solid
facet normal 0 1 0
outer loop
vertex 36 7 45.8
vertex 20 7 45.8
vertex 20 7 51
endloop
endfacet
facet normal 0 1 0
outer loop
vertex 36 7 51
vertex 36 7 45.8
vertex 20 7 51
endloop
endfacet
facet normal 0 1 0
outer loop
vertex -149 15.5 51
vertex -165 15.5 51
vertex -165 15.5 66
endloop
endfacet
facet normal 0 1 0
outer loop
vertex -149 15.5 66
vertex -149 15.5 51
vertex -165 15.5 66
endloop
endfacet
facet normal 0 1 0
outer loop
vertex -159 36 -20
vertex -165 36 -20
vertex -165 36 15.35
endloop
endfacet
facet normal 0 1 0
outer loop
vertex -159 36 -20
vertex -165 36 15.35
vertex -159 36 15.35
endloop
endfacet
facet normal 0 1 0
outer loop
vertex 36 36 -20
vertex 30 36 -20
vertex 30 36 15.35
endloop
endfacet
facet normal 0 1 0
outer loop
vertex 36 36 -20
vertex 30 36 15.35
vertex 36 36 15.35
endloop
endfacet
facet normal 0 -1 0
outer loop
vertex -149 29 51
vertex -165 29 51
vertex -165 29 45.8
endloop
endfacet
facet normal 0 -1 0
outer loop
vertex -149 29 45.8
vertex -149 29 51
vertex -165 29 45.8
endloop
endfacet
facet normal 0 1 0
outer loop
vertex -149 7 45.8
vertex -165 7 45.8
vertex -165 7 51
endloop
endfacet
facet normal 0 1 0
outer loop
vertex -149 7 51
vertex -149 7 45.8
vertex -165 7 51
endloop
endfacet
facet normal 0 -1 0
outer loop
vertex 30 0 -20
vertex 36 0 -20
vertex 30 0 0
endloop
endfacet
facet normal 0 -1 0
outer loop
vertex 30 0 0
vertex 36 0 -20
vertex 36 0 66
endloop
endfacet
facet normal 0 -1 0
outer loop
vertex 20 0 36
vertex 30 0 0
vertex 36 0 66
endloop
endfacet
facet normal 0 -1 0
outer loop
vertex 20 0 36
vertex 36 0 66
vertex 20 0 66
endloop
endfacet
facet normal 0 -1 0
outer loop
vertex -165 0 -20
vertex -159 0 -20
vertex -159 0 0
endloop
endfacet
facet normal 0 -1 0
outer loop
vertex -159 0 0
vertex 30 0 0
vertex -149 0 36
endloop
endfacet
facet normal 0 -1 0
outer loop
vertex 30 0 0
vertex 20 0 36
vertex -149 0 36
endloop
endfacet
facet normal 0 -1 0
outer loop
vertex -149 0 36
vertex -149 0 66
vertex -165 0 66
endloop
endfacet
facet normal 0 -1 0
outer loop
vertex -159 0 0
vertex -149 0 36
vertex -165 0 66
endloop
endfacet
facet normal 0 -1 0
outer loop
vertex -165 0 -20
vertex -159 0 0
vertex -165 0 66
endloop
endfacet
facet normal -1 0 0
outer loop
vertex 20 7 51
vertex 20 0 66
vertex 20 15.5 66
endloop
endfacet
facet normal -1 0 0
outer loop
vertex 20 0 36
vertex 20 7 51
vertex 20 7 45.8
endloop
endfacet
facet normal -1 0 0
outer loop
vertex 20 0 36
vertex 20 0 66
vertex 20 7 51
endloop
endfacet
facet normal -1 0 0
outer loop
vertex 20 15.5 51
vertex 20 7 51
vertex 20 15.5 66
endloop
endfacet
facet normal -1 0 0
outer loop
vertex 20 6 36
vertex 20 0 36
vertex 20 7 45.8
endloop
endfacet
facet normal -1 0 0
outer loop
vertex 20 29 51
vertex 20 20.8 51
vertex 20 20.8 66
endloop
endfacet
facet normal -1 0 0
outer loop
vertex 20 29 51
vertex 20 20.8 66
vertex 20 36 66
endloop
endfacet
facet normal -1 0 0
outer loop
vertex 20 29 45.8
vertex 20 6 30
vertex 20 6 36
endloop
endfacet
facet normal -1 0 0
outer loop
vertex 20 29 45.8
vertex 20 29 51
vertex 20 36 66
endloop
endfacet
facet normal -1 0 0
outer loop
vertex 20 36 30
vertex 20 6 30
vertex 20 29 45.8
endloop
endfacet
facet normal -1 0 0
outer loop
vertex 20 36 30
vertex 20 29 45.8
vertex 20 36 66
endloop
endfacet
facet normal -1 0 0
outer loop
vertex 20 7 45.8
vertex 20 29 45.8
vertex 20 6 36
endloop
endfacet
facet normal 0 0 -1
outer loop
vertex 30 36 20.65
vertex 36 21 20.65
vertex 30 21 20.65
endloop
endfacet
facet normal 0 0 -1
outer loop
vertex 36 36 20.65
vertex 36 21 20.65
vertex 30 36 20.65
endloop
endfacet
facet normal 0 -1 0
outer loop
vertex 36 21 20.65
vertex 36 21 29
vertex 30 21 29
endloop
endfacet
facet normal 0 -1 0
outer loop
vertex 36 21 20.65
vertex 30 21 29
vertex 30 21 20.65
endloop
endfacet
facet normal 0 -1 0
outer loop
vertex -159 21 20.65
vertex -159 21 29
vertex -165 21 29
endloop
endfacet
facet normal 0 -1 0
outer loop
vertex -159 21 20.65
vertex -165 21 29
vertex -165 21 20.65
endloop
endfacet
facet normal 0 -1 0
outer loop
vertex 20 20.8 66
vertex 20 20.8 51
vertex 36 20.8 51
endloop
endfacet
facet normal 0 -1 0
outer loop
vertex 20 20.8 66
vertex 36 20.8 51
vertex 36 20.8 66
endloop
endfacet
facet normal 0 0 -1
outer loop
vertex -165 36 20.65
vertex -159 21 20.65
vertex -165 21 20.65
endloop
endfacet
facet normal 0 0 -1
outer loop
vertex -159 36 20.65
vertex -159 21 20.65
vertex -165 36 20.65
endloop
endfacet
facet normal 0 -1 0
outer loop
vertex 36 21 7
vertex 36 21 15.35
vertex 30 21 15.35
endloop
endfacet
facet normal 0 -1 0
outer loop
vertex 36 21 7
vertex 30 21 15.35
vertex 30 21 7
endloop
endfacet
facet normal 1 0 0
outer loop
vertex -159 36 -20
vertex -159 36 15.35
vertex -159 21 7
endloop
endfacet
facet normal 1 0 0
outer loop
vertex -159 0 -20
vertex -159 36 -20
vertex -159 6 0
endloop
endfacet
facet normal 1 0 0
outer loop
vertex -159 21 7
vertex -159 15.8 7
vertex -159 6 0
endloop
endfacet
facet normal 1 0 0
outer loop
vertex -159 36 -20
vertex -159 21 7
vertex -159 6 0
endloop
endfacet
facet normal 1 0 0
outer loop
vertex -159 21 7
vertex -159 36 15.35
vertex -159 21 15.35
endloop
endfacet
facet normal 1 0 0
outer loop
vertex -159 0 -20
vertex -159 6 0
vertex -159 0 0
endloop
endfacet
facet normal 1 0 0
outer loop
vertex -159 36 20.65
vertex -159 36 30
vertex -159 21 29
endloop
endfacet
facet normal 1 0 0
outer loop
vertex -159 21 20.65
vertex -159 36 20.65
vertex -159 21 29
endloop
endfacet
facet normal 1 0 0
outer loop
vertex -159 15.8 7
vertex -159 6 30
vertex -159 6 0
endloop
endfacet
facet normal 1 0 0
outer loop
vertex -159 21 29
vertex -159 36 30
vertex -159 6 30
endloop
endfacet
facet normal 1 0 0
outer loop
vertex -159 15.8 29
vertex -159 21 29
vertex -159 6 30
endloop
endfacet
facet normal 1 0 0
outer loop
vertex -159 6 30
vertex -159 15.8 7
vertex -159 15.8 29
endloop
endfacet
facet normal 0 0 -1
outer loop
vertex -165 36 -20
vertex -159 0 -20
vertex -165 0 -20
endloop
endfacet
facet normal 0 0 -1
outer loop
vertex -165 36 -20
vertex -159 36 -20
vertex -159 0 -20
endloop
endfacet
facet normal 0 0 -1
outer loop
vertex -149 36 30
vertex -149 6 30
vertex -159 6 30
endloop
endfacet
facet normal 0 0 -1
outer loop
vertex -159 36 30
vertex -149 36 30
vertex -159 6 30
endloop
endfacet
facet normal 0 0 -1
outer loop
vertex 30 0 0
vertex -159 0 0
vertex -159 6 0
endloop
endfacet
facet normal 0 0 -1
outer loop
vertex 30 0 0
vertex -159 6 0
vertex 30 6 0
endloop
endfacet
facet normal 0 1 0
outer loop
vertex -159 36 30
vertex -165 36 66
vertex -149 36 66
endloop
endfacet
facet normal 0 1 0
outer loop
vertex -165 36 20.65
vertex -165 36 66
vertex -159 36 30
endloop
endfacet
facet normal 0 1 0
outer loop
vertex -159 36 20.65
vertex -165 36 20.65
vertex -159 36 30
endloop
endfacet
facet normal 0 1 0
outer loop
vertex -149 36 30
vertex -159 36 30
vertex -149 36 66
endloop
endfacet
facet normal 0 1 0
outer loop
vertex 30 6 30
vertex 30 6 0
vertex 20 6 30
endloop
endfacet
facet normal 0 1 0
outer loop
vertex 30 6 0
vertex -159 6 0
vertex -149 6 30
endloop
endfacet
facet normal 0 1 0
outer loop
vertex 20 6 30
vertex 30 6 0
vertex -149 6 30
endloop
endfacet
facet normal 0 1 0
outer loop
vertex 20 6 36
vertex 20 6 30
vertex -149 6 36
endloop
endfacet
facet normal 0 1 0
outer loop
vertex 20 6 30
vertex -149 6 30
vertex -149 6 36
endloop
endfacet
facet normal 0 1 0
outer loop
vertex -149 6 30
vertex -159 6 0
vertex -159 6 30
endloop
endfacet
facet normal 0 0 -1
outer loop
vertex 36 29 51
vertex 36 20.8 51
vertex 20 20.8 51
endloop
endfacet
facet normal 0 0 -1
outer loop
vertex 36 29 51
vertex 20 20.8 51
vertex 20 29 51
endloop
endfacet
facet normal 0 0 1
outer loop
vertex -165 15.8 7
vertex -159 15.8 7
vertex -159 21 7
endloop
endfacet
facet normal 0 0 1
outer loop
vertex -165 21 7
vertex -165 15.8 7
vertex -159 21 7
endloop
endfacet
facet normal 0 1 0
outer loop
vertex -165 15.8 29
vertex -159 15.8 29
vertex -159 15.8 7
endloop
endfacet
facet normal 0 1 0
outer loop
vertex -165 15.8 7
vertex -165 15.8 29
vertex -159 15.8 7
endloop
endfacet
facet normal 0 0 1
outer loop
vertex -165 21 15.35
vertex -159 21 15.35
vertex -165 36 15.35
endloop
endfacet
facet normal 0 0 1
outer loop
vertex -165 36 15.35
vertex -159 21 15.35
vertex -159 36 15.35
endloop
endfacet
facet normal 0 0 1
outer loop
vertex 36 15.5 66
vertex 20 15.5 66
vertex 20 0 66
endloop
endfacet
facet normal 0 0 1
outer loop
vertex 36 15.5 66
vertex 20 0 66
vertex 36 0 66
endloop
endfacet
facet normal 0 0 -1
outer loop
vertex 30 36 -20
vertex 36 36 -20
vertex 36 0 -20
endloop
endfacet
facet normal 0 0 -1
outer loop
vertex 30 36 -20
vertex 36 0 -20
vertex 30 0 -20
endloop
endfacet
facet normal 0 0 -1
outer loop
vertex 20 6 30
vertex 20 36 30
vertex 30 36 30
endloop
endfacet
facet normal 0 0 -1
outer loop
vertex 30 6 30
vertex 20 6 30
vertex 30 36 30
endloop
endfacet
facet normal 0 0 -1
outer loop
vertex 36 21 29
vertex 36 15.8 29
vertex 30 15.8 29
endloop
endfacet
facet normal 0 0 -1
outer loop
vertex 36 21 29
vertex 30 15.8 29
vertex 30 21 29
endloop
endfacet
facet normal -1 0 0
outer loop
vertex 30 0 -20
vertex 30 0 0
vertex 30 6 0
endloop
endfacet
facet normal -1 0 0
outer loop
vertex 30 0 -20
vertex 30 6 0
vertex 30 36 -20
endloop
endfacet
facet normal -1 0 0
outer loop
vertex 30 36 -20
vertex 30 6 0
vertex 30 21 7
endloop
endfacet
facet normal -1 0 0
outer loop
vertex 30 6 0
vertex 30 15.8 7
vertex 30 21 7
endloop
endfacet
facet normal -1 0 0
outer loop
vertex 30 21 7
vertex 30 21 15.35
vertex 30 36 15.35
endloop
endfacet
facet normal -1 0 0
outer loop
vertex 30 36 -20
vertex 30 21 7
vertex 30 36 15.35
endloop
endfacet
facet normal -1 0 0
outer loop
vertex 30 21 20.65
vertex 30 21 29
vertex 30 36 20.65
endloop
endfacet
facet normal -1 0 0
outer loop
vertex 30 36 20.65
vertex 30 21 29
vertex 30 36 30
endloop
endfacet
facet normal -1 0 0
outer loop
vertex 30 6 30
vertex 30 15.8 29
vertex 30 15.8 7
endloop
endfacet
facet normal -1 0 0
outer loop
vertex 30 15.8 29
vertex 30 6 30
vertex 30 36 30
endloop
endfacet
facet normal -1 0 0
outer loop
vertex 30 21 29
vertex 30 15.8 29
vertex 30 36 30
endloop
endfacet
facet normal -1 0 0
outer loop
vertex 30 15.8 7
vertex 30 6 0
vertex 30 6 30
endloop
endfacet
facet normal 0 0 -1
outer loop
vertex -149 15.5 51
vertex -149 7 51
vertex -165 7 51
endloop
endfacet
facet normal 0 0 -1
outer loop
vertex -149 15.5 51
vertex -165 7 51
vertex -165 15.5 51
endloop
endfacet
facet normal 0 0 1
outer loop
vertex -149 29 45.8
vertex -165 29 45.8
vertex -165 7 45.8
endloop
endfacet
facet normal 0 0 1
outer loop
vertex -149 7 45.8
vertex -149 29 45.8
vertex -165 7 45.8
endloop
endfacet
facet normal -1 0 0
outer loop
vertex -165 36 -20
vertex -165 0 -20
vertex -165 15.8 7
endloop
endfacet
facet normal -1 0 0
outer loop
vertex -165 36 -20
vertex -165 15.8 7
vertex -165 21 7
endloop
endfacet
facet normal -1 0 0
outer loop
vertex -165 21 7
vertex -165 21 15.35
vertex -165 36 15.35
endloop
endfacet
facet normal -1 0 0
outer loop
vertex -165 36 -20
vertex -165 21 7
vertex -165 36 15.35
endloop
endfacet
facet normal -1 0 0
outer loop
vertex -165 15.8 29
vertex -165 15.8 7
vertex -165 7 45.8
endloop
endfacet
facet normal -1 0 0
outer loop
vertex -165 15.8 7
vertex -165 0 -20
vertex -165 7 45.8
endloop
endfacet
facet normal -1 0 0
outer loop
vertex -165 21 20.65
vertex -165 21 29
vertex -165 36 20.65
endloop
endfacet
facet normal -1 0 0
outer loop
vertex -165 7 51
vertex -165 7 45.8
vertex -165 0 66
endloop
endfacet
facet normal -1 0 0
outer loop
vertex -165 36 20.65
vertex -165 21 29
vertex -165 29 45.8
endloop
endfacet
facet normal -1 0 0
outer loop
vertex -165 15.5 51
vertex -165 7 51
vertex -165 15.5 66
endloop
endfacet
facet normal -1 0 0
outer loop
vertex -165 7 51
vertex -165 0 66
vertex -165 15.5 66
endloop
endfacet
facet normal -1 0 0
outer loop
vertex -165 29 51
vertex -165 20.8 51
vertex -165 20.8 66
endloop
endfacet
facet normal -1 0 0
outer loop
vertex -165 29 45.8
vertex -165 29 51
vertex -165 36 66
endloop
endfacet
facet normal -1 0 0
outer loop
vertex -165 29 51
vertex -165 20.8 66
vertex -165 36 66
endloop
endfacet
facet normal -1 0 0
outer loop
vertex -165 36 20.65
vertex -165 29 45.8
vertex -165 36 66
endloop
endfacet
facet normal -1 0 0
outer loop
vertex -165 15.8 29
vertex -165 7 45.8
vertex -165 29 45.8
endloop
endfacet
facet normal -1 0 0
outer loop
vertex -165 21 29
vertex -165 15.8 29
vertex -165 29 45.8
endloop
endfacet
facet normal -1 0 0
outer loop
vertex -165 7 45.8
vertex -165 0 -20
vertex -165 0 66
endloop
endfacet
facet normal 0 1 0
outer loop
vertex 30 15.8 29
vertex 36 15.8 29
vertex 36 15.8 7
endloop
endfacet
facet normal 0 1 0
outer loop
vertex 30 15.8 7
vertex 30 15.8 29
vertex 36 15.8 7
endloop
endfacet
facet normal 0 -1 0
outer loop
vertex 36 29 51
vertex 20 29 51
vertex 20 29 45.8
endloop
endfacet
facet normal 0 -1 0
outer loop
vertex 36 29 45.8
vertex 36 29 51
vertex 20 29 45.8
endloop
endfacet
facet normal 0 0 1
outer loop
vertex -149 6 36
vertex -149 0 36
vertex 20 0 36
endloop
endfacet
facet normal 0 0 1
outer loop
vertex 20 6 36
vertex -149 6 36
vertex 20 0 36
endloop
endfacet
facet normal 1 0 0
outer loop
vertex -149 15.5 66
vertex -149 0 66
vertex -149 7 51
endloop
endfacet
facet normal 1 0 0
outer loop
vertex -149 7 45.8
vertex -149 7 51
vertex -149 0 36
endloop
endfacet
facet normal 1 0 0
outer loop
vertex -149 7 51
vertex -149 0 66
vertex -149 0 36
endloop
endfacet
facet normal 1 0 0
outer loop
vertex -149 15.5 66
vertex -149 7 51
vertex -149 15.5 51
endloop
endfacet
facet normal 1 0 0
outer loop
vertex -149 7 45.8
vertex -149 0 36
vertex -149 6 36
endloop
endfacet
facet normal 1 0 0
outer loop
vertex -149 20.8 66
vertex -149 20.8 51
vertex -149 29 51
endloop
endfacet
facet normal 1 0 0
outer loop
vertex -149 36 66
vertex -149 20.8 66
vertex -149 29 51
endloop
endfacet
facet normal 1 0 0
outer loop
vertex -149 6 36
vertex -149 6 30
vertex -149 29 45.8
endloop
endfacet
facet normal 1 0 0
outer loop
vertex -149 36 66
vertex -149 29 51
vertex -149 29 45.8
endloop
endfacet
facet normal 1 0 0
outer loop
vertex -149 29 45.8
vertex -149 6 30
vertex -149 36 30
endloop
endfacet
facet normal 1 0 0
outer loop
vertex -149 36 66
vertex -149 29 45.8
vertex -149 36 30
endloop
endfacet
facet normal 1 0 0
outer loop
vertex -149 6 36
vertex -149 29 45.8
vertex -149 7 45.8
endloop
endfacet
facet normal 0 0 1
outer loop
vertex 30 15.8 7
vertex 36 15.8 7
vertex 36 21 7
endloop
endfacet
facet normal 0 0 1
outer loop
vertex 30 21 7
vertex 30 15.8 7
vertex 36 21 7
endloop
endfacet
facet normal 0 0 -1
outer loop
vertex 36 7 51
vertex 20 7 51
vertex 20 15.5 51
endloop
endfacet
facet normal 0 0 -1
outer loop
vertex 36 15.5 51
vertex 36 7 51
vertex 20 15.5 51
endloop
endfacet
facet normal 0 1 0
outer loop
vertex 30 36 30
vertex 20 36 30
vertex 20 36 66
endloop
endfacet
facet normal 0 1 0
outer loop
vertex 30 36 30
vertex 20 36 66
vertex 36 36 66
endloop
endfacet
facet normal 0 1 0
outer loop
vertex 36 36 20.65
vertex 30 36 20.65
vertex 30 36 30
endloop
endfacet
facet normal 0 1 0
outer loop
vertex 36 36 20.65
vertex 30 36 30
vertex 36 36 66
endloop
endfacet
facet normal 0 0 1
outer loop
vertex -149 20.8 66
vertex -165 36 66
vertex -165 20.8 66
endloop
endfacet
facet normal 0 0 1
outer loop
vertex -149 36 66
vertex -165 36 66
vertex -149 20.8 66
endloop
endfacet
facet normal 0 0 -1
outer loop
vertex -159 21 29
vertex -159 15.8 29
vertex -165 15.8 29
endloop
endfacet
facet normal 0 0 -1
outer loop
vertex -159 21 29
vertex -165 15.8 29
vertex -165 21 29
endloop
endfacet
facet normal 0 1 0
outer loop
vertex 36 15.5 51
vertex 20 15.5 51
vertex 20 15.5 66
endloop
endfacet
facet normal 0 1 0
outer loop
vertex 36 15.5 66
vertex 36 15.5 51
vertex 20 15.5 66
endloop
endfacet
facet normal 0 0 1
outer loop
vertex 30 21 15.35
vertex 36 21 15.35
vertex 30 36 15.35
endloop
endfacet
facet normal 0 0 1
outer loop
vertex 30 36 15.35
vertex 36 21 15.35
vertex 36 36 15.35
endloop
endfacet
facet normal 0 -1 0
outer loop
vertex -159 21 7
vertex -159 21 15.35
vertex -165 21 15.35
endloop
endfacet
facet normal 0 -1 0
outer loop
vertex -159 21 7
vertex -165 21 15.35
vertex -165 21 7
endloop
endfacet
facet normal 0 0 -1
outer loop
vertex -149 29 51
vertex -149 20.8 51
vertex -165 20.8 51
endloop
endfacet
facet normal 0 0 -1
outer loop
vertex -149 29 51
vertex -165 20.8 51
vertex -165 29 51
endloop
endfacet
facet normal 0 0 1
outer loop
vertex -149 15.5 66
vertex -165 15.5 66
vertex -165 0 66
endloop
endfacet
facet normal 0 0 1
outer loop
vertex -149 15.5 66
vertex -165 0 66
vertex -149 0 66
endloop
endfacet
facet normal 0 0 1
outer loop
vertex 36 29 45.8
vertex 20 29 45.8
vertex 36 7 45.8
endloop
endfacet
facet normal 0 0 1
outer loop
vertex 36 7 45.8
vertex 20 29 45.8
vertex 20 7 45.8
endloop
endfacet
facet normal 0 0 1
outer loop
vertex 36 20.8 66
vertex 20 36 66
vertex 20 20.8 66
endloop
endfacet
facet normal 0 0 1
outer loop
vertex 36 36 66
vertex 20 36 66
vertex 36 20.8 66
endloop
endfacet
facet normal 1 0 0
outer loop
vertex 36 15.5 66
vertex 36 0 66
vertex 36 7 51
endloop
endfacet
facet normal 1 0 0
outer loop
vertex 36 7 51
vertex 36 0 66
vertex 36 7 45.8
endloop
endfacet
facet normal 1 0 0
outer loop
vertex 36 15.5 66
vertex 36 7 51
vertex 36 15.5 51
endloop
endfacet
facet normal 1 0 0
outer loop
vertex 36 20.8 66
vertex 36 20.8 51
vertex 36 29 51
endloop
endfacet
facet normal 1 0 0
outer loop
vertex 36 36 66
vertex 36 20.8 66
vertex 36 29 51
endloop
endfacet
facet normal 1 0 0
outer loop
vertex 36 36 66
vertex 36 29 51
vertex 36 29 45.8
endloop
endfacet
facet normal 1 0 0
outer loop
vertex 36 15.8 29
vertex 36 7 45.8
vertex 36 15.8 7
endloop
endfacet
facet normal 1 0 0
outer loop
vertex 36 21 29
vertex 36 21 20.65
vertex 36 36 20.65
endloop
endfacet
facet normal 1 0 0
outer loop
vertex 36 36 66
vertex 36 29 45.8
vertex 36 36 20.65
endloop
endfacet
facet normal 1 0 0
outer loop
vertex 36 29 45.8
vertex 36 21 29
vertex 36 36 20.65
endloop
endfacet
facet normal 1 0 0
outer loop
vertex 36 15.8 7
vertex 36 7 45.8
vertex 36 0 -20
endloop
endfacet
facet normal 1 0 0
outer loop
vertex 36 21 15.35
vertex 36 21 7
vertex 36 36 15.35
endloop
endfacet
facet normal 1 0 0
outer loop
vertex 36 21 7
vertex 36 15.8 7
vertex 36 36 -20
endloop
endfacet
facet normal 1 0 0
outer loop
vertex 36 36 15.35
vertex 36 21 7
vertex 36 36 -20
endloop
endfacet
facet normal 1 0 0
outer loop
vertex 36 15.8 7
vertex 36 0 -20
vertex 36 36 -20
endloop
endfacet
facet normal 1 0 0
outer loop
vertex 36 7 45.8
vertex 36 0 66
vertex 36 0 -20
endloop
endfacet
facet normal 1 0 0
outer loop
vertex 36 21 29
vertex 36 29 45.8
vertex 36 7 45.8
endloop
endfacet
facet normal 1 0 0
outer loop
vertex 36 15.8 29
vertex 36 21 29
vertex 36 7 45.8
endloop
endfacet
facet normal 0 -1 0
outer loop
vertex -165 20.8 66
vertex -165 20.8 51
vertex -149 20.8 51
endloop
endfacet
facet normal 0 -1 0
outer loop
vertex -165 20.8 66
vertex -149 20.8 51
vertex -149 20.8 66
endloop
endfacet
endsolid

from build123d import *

# Parameters (mm, degrees)
SKETCH1_W           = 30
SKETCH1_H           = 30
BOSS_EXTRUDE1_DEPTH = 6
SKETCH2_W           = 30
SKETCH2_H           = 36
BOSS_EXTRUDE2_DEPTH = 6
SKETCH3_W           = 36
SKETCH3_H           = 36
BOSS_EXTRUDE3_DEPTH = 6
SKETCH4_W           = 36
SKETCH4_H           = 6
BOSS_EXTRUDE4_DEPTH = 165
SKETCH6_W           = 6
SKETCH6_H           = 30
BOSS_EXTRUDE6_DEPTH = 30
SKETCH9_W           = 6
SKETCH9_H           = 30
CUT_EXTRUDE2_DEPTH  = 20
SKETCH11_W          = 22
SKETCH11_H          = 5.2
SKETCH11_W_2        = 5.3
SKETCH11_H_2        = 15
CUT_EXTRUDE3_DEPTH  = 500
SKETCH13_W          = 16
SKETCH13_H          = 36
BOSS_EXTRUDE7_DEPTH = 30
SKETCH16_W          = 15
SKETCH16_H          = 5.3
CUT_EXTRUDE4_DEPTH  = 2090
SKETCH17_W          = 6
SKETCH17_H          = 36
BOSS_EXTRUDE8_DEPTH = 20


with BuildPart() as part:
    # Sketch1 → Boss-Extrude1 (new body)
    with BuildSketch(Plane(origin=(0, 0, 0), x_dir=(1, 0, 0), z_dir=(0, 1, 0))):
        with Locations((15, -15)):
            Rectangle(SKETCH1_W, SKETCH1_H)
    extrude(amount=BOSS_EXTRUDE1_DEPTH)

    # Sketch2 → Boss-Extrude2 (add)
    with BuildSketch(Plane(origin=(30, 0, 0), x_dir=(0, 0, -1), z_dir=(1, 0, 0))):
        with Locations((-15, 18)):
            Rectangle(SKETCH2_W, SKETCH2_H)
    extrude(amount=BOSS_EXTRUDE2_DEPTH)

    # Sketch3 → Boss-Extrude3 (add)
    with BuildSketch(Plane.XY.offset(30)):
        with Locations((18, 18)):
            Rectangle(SKETCH3_W, SKETCH3_H)
    extrude(amount=BOSS_EXTRUDE3_DEPTH)

    # Sketch4 → Boss-Extrude4 (add)
    with BuildSketch(Plane.ZY):
        with Locations((18, 3)):
            Rectangle(SKETCH4_W, SKETCH4_H)
    extrude(amount=BOSS_EXTRUDE4_DEPTH)

    # Sketch6 → Boss-Extrude6 (add)
    with BuildSketch(Plane(origin=(0, 6, 0), x_dir=(1, 0, 0), z_dir=(0, 1, 0))):
        Polygon((-165, -30), (-165, -36), (-149, -36), (-149, -30), (-159, -30), align=None)
        with Locations((-162, -15)):
            Rectangle(SKETCH6_W, SKETCH6_H)
    extrude(amount=BOSS_EXTRUDE6_DEPTH)

    # Sketch9 → Cut-Extrude2 (cut)
    with BuildSketch(Plane.ZY):
        with Locations((33, 21)):
            Rectangle(SKETCH9_W, SKETCH9_H)
    extrude(amount=-CUT_EXTRUDE2_DEPTH, mode=Mode.SUBTRACT)

    # Sketch11 → Cut-Extrude3 (cut)
    with BuildSketch(Plane(origin=(36, 0, 0), x_dir=(0, 0, -1), z_dir=(1, 0, 0))):
        with Locations((-18, 18.4)):
            Rectangle(SKETCH11_W, SKETCH11_H)
        with Locations((-18, 28.5)):
            Rectangle(SKETCH11_W_2, SKETCH11_H_2)
    extrude(amount=-CUT_EXTRUDE3_DEPTH, mode=Mode.SUBTRACT)

    # Sketch13 → Boss-Extrude7 (add)
    with BuildSketch(Plane.XY.offset(36)):
        with Locations((-157, 18)):
            Rectangle(SKETCH13_W, SKETCH13_H)
        with Locations((28, 18)):
            Rectangle(SKETCH13_W, SKETCH13_H)
    extrude(amount=BOSS_EXTRUDE7_DEPTH)

    # Sketch16 → Cut-Extrude4 (cut)
    with BuildSketch(Plane.ZY.offset(165)):
        Polygon((51, 15.5), (51, 20.8), (51, 29), (45.8, 29), (45.8, 7), (51, 7), align=None)
        with Locations((58.5, 18.15)):
            Rectangle(SKETCH16_W, SKETCH16_H)
    extrude(amount=-CUT_EXTRUDE4_DEPTH, mode=Mode.SUBTRACT)

    # Sketch17 → Boss-Extrude8 (add)
    with BuildSketch(Plane(origin=(0, 0, 0), x_dir=(-1, 0, 0), z_dir=(0, 0, -1))):
        Polygon((159, 6), (159, 0), (165, 0), (165, 36), (159, 36), align=None)
        with Locations((-33, 18)):
            Rectangle(SKETCH17_W, SKETCH17_H)
    extrude(amount=BOSS_EXTRUDE8_DEPTH)


solid = part.part
